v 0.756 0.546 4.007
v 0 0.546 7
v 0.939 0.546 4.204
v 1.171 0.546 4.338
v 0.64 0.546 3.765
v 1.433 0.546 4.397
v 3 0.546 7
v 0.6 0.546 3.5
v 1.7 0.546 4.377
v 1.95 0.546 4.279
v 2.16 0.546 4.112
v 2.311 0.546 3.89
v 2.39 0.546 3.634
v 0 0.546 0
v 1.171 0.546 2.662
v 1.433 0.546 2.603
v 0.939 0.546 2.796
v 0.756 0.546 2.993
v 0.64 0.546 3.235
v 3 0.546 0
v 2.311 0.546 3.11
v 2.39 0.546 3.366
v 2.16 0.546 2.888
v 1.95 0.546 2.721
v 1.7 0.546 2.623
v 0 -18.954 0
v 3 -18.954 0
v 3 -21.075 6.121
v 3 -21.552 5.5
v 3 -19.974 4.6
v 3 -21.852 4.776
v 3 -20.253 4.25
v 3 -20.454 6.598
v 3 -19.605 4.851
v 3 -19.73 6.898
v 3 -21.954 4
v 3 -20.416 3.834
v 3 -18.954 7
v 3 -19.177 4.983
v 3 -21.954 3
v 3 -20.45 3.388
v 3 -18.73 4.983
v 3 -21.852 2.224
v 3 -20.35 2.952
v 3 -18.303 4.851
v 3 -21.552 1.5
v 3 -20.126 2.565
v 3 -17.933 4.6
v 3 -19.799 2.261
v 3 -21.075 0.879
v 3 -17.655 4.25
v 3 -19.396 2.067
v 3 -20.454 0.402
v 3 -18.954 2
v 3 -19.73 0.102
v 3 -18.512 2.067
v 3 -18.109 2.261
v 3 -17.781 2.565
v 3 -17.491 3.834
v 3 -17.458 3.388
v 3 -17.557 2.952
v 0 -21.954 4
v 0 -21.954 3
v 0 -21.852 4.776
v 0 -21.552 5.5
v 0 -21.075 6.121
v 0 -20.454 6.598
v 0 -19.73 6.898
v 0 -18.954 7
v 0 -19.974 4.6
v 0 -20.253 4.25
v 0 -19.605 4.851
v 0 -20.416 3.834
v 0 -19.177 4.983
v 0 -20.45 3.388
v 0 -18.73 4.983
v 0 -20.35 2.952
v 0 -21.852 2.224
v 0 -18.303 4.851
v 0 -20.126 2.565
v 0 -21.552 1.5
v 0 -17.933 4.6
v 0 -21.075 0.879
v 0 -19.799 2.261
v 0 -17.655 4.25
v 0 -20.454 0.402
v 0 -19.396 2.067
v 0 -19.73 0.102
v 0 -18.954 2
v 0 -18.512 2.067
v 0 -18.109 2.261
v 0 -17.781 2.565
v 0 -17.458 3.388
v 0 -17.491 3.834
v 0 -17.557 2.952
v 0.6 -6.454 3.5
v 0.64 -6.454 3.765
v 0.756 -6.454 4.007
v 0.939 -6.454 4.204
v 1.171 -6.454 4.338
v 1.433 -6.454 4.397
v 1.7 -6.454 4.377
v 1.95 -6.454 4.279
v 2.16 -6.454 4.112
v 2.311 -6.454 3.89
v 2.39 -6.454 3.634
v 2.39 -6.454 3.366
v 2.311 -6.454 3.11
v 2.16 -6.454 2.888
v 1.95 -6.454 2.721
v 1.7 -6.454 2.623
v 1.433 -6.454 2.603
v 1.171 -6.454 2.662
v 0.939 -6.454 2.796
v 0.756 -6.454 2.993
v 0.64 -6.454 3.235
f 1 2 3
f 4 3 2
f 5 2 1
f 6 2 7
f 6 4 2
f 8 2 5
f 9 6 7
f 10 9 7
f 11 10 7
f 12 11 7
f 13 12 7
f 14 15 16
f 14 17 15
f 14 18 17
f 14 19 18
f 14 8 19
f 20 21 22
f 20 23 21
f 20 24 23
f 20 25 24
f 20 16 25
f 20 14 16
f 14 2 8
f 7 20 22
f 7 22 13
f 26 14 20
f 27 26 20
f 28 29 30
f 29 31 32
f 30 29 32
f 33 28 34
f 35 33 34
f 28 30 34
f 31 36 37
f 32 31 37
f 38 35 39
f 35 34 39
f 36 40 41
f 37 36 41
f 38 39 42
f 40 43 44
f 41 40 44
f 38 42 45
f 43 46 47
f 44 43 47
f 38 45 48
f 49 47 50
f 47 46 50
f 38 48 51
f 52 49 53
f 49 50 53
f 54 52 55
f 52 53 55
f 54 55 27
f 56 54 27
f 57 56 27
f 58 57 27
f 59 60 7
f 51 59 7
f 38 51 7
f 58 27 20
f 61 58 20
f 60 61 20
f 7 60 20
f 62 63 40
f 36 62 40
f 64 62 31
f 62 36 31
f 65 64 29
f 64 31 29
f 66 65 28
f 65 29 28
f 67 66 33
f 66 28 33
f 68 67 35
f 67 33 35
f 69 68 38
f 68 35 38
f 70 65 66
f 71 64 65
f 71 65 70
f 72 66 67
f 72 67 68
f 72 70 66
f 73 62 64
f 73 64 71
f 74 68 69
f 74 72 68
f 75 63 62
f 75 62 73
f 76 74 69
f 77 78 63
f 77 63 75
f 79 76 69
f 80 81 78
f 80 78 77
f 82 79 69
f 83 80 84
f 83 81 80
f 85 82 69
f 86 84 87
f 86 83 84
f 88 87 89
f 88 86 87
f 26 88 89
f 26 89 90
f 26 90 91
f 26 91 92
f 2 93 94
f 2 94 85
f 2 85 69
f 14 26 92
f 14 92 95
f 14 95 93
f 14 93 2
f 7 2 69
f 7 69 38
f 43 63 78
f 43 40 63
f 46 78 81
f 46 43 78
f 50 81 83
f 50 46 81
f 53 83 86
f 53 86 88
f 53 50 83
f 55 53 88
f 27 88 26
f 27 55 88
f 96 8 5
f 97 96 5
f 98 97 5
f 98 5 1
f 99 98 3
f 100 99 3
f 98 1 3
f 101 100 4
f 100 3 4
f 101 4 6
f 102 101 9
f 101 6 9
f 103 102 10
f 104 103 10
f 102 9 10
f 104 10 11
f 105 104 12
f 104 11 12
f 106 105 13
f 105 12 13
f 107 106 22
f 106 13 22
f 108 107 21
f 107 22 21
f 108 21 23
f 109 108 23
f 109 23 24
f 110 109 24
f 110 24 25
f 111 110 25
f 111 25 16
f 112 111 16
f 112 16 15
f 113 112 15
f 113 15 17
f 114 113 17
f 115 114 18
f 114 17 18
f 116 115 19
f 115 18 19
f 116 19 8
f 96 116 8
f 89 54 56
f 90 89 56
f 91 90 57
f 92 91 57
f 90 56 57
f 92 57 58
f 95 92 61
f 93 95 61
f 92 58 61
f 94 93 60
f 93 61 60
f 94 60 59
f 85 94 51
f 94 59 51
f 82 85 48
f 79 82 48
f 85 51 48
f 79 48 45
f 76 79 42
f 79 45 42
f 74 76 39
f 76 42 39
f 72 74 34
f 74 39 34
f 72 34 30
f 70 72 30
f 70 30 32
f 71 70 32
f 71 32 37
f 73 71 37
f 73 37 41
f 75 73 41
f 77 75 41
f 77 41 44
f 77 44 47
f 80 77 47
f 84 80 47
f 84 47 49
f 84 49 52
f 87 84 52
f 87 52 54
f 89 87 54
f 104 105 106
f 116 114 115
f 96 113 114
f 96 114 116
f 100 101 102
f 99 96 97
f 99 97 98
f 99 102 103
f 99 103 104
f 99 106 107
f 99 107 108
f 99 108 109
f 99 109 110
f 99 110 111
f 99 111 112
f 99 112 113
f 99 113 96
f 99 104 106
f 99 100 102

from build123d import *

# Parameters (mm, degrees)
SKETCH_1_W          = 3
SKETCH_1_H          = 22.5
EXTRUDE_1_DEPTH     = 7
SKETCH_4_R          = 1.5
CUT_EXTRUDE_2_DEPTH = 24.237188714
FILLET_1_R          = 3
SKETCH_3_R          = 0.9
CUT_EXTRUDE_4_DEPTH = 7


with BuildPart() as part:
    # 草图1 → 凸台-拉伸1 (new body)
    with BuildSketch(Plane.XY):
        with Locations((1.5, -10.703745451)):
            Rectangle(SKETCH_1_W, SKETCH_1_H)
    extrude(amount=EXTRUDE_1_DEPTH)

    # 草图4 → 切除-拉伸2 (cut, through all)
    with BuildSketch(Plane(origin=(3, 0, 0), x_dir=(0, 0, -1), z_dir=(1, 0, 0))):
        with Locations((-3.5, -18.953745451)):
            Circle(SKETCH_4_R)
    extrude(amount=-CUT_EXTRUDE_2_DEPTH, mode=Mode.SUBTRACT)

    # 圆角1
    fillet_1_edges = [part.edges().sort_by_distance(p)[0] for p in [
        (1.5, -21.953745451, 7),
        (1.5, -21.953745451, 0),
    ]]
    fillet(fillet_1_edges, radius=FILLET_1_R)

    # 草图3 → 切除-拉伸4 (cut)
    with BuildSketch(Plane(origin=(0, 0.546254549, 0), x_dir=(1, 0, 0), z_dir=(0, 1, 0))):
        with Locations(Location((1.5, -3.5, 0), (0, 0, 180))):
            Circle(SKETCH_3_R)
    extrude(amount=-CUT_EXTRUDE_4_DEPTH, mode=Mode.SUBTRACT)


solid = part.part
